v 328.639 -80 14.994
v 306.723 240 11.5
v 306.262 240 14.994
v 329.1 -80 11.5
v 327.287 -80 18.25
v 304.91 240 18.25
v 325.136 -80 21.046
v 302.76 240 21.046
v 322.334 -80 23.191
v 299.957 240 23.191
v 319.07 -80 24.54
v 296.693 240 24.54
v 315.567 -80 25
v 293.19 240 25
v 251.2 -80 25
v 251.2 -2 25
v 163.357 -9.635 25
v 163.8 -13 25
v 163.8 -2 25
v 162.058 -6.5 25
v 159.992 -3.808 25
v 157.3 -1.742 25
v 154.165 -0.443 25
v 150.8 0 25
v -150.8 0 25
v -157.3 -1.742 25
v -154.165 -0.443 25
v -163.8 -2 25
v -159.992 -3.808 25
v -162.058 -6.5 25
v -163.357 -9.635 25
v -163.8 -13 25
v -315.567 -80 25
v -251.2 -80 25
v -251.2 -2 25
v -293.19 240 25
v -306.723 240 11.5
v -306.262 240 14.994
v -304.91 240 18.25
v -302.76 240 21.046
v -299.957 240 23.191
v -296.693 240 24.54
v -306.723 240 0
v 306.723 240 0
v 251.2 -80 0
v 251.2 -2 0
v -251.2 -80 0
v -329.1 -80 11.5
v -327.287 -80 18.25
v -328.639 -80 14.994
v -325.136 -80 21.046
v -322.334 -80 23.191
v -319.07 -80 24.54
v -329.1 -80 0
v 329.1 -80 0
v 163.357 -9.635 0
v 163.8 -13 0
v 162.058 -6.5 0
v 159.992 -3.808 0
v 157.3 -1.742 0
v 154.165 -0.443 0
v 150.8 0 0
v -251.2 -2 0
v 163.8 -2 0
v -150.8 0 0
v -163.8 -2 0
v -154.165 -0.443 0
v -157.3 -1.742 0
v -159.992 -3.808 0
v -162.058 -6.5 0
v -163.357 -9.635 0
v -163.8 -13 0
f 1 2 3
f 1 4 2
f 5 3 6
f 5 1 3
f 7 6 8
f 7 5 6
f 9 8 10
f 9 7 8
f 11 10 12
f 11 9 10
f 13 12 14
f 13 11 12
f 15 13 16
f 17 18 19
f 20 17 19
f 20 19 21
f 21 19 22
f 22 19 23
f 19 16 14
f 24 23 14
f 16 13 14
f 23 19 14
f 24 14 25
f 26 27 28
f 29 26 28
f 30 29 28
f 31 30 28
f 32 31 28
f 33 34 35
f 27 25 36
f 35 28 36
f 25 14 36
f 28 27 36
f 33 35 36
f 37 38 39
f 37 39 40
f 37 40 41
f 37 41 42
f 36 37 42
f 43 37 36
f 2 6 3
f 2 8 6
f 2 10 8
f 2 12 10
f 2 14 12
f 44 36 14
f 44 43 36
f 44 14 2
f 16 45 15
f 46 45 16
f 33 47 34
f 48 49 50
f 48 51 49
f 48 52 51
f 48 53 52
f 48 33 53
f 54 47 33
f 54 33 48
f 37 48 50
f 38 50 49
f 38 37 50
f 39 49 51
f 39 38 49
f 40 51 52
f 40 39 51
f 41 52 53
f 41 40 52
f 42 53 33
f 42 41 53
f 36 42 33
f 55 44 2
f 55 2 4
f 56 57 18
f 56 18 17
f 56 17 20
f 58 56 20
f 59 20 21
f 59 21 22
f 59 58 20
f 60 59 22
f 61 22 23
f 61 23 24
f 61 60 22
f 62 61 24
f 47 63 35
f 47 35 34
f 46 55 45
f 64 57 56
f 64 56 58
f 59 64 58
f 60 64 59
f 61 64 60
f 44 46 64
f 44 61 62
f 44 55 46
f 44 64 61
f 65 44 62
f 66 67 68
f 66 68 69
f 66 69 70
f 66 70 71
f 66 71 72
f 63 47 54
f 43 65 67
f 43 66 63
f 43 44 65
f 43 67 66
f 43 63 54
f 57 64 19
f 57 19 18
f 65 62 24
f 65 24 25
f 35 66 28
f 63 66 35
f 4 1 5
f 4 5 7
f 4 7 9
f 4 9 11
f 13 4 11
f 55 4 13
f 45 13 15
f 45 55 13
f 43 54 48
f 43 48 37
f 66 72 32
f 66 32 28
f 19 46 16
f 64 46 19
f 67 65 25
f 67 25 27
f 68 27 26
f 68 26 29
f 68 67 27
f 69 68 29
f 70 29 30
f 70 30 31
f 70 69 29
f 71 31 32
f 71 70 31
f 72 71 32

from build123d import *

# Parameters (mm, degrees)
BOSS_EXTRUDE1_DEPTH = 25
FILLET1_R           = 13.5


with BuildPart() as part:
    # Sketch1 → Boss-Extrude1 (new body)
    with BuildSketch(Plane.XY):
        with BuildLine():
            Line((-251.2, -2), (-251.2, -80))
            Line((-251.2, -80), (-329.1, -80))
            Line((-329.1, -80), (-306.723420178, 240))
            Line((-306.723420178, 240), (306.723420178, 240))
            Line((306.723420178, 240), (329.1, -80))
            Line((329.1, -80), (251.2, -80))
            Line((251.2, -80), (251.2, -2))
            Line((251.2, -2), (163.8, -2))
            Line((163.8, -2), (163.8, -13))
            ThreePointArc((163.8, -13), (159.992388155, -3.807611845), (150.8, 0))
            Line((150.8, 0), (-150.8, 0))
            ThreePointArc((-150.8, 0), (-159.992388155, -3.807611845), (-163.8, -13))
            Line((-163.8, -13), (-163.8, -2))
            Line((-163.8, -2), (-251.2, -2))
        make_face()
    extrude(amount=BOSS_EXTRUDE1_DEPTH)

    # Fillet1
    fillet1_edges = [part.edges().sort_by_distance(p)[0] for p in [
        (317.911710089, 80, 25),
        (-317.911710089, 80, 25),
    ]]
    fillet(fillet1_edges, radius=FILLET1_R)


solid = part.part
